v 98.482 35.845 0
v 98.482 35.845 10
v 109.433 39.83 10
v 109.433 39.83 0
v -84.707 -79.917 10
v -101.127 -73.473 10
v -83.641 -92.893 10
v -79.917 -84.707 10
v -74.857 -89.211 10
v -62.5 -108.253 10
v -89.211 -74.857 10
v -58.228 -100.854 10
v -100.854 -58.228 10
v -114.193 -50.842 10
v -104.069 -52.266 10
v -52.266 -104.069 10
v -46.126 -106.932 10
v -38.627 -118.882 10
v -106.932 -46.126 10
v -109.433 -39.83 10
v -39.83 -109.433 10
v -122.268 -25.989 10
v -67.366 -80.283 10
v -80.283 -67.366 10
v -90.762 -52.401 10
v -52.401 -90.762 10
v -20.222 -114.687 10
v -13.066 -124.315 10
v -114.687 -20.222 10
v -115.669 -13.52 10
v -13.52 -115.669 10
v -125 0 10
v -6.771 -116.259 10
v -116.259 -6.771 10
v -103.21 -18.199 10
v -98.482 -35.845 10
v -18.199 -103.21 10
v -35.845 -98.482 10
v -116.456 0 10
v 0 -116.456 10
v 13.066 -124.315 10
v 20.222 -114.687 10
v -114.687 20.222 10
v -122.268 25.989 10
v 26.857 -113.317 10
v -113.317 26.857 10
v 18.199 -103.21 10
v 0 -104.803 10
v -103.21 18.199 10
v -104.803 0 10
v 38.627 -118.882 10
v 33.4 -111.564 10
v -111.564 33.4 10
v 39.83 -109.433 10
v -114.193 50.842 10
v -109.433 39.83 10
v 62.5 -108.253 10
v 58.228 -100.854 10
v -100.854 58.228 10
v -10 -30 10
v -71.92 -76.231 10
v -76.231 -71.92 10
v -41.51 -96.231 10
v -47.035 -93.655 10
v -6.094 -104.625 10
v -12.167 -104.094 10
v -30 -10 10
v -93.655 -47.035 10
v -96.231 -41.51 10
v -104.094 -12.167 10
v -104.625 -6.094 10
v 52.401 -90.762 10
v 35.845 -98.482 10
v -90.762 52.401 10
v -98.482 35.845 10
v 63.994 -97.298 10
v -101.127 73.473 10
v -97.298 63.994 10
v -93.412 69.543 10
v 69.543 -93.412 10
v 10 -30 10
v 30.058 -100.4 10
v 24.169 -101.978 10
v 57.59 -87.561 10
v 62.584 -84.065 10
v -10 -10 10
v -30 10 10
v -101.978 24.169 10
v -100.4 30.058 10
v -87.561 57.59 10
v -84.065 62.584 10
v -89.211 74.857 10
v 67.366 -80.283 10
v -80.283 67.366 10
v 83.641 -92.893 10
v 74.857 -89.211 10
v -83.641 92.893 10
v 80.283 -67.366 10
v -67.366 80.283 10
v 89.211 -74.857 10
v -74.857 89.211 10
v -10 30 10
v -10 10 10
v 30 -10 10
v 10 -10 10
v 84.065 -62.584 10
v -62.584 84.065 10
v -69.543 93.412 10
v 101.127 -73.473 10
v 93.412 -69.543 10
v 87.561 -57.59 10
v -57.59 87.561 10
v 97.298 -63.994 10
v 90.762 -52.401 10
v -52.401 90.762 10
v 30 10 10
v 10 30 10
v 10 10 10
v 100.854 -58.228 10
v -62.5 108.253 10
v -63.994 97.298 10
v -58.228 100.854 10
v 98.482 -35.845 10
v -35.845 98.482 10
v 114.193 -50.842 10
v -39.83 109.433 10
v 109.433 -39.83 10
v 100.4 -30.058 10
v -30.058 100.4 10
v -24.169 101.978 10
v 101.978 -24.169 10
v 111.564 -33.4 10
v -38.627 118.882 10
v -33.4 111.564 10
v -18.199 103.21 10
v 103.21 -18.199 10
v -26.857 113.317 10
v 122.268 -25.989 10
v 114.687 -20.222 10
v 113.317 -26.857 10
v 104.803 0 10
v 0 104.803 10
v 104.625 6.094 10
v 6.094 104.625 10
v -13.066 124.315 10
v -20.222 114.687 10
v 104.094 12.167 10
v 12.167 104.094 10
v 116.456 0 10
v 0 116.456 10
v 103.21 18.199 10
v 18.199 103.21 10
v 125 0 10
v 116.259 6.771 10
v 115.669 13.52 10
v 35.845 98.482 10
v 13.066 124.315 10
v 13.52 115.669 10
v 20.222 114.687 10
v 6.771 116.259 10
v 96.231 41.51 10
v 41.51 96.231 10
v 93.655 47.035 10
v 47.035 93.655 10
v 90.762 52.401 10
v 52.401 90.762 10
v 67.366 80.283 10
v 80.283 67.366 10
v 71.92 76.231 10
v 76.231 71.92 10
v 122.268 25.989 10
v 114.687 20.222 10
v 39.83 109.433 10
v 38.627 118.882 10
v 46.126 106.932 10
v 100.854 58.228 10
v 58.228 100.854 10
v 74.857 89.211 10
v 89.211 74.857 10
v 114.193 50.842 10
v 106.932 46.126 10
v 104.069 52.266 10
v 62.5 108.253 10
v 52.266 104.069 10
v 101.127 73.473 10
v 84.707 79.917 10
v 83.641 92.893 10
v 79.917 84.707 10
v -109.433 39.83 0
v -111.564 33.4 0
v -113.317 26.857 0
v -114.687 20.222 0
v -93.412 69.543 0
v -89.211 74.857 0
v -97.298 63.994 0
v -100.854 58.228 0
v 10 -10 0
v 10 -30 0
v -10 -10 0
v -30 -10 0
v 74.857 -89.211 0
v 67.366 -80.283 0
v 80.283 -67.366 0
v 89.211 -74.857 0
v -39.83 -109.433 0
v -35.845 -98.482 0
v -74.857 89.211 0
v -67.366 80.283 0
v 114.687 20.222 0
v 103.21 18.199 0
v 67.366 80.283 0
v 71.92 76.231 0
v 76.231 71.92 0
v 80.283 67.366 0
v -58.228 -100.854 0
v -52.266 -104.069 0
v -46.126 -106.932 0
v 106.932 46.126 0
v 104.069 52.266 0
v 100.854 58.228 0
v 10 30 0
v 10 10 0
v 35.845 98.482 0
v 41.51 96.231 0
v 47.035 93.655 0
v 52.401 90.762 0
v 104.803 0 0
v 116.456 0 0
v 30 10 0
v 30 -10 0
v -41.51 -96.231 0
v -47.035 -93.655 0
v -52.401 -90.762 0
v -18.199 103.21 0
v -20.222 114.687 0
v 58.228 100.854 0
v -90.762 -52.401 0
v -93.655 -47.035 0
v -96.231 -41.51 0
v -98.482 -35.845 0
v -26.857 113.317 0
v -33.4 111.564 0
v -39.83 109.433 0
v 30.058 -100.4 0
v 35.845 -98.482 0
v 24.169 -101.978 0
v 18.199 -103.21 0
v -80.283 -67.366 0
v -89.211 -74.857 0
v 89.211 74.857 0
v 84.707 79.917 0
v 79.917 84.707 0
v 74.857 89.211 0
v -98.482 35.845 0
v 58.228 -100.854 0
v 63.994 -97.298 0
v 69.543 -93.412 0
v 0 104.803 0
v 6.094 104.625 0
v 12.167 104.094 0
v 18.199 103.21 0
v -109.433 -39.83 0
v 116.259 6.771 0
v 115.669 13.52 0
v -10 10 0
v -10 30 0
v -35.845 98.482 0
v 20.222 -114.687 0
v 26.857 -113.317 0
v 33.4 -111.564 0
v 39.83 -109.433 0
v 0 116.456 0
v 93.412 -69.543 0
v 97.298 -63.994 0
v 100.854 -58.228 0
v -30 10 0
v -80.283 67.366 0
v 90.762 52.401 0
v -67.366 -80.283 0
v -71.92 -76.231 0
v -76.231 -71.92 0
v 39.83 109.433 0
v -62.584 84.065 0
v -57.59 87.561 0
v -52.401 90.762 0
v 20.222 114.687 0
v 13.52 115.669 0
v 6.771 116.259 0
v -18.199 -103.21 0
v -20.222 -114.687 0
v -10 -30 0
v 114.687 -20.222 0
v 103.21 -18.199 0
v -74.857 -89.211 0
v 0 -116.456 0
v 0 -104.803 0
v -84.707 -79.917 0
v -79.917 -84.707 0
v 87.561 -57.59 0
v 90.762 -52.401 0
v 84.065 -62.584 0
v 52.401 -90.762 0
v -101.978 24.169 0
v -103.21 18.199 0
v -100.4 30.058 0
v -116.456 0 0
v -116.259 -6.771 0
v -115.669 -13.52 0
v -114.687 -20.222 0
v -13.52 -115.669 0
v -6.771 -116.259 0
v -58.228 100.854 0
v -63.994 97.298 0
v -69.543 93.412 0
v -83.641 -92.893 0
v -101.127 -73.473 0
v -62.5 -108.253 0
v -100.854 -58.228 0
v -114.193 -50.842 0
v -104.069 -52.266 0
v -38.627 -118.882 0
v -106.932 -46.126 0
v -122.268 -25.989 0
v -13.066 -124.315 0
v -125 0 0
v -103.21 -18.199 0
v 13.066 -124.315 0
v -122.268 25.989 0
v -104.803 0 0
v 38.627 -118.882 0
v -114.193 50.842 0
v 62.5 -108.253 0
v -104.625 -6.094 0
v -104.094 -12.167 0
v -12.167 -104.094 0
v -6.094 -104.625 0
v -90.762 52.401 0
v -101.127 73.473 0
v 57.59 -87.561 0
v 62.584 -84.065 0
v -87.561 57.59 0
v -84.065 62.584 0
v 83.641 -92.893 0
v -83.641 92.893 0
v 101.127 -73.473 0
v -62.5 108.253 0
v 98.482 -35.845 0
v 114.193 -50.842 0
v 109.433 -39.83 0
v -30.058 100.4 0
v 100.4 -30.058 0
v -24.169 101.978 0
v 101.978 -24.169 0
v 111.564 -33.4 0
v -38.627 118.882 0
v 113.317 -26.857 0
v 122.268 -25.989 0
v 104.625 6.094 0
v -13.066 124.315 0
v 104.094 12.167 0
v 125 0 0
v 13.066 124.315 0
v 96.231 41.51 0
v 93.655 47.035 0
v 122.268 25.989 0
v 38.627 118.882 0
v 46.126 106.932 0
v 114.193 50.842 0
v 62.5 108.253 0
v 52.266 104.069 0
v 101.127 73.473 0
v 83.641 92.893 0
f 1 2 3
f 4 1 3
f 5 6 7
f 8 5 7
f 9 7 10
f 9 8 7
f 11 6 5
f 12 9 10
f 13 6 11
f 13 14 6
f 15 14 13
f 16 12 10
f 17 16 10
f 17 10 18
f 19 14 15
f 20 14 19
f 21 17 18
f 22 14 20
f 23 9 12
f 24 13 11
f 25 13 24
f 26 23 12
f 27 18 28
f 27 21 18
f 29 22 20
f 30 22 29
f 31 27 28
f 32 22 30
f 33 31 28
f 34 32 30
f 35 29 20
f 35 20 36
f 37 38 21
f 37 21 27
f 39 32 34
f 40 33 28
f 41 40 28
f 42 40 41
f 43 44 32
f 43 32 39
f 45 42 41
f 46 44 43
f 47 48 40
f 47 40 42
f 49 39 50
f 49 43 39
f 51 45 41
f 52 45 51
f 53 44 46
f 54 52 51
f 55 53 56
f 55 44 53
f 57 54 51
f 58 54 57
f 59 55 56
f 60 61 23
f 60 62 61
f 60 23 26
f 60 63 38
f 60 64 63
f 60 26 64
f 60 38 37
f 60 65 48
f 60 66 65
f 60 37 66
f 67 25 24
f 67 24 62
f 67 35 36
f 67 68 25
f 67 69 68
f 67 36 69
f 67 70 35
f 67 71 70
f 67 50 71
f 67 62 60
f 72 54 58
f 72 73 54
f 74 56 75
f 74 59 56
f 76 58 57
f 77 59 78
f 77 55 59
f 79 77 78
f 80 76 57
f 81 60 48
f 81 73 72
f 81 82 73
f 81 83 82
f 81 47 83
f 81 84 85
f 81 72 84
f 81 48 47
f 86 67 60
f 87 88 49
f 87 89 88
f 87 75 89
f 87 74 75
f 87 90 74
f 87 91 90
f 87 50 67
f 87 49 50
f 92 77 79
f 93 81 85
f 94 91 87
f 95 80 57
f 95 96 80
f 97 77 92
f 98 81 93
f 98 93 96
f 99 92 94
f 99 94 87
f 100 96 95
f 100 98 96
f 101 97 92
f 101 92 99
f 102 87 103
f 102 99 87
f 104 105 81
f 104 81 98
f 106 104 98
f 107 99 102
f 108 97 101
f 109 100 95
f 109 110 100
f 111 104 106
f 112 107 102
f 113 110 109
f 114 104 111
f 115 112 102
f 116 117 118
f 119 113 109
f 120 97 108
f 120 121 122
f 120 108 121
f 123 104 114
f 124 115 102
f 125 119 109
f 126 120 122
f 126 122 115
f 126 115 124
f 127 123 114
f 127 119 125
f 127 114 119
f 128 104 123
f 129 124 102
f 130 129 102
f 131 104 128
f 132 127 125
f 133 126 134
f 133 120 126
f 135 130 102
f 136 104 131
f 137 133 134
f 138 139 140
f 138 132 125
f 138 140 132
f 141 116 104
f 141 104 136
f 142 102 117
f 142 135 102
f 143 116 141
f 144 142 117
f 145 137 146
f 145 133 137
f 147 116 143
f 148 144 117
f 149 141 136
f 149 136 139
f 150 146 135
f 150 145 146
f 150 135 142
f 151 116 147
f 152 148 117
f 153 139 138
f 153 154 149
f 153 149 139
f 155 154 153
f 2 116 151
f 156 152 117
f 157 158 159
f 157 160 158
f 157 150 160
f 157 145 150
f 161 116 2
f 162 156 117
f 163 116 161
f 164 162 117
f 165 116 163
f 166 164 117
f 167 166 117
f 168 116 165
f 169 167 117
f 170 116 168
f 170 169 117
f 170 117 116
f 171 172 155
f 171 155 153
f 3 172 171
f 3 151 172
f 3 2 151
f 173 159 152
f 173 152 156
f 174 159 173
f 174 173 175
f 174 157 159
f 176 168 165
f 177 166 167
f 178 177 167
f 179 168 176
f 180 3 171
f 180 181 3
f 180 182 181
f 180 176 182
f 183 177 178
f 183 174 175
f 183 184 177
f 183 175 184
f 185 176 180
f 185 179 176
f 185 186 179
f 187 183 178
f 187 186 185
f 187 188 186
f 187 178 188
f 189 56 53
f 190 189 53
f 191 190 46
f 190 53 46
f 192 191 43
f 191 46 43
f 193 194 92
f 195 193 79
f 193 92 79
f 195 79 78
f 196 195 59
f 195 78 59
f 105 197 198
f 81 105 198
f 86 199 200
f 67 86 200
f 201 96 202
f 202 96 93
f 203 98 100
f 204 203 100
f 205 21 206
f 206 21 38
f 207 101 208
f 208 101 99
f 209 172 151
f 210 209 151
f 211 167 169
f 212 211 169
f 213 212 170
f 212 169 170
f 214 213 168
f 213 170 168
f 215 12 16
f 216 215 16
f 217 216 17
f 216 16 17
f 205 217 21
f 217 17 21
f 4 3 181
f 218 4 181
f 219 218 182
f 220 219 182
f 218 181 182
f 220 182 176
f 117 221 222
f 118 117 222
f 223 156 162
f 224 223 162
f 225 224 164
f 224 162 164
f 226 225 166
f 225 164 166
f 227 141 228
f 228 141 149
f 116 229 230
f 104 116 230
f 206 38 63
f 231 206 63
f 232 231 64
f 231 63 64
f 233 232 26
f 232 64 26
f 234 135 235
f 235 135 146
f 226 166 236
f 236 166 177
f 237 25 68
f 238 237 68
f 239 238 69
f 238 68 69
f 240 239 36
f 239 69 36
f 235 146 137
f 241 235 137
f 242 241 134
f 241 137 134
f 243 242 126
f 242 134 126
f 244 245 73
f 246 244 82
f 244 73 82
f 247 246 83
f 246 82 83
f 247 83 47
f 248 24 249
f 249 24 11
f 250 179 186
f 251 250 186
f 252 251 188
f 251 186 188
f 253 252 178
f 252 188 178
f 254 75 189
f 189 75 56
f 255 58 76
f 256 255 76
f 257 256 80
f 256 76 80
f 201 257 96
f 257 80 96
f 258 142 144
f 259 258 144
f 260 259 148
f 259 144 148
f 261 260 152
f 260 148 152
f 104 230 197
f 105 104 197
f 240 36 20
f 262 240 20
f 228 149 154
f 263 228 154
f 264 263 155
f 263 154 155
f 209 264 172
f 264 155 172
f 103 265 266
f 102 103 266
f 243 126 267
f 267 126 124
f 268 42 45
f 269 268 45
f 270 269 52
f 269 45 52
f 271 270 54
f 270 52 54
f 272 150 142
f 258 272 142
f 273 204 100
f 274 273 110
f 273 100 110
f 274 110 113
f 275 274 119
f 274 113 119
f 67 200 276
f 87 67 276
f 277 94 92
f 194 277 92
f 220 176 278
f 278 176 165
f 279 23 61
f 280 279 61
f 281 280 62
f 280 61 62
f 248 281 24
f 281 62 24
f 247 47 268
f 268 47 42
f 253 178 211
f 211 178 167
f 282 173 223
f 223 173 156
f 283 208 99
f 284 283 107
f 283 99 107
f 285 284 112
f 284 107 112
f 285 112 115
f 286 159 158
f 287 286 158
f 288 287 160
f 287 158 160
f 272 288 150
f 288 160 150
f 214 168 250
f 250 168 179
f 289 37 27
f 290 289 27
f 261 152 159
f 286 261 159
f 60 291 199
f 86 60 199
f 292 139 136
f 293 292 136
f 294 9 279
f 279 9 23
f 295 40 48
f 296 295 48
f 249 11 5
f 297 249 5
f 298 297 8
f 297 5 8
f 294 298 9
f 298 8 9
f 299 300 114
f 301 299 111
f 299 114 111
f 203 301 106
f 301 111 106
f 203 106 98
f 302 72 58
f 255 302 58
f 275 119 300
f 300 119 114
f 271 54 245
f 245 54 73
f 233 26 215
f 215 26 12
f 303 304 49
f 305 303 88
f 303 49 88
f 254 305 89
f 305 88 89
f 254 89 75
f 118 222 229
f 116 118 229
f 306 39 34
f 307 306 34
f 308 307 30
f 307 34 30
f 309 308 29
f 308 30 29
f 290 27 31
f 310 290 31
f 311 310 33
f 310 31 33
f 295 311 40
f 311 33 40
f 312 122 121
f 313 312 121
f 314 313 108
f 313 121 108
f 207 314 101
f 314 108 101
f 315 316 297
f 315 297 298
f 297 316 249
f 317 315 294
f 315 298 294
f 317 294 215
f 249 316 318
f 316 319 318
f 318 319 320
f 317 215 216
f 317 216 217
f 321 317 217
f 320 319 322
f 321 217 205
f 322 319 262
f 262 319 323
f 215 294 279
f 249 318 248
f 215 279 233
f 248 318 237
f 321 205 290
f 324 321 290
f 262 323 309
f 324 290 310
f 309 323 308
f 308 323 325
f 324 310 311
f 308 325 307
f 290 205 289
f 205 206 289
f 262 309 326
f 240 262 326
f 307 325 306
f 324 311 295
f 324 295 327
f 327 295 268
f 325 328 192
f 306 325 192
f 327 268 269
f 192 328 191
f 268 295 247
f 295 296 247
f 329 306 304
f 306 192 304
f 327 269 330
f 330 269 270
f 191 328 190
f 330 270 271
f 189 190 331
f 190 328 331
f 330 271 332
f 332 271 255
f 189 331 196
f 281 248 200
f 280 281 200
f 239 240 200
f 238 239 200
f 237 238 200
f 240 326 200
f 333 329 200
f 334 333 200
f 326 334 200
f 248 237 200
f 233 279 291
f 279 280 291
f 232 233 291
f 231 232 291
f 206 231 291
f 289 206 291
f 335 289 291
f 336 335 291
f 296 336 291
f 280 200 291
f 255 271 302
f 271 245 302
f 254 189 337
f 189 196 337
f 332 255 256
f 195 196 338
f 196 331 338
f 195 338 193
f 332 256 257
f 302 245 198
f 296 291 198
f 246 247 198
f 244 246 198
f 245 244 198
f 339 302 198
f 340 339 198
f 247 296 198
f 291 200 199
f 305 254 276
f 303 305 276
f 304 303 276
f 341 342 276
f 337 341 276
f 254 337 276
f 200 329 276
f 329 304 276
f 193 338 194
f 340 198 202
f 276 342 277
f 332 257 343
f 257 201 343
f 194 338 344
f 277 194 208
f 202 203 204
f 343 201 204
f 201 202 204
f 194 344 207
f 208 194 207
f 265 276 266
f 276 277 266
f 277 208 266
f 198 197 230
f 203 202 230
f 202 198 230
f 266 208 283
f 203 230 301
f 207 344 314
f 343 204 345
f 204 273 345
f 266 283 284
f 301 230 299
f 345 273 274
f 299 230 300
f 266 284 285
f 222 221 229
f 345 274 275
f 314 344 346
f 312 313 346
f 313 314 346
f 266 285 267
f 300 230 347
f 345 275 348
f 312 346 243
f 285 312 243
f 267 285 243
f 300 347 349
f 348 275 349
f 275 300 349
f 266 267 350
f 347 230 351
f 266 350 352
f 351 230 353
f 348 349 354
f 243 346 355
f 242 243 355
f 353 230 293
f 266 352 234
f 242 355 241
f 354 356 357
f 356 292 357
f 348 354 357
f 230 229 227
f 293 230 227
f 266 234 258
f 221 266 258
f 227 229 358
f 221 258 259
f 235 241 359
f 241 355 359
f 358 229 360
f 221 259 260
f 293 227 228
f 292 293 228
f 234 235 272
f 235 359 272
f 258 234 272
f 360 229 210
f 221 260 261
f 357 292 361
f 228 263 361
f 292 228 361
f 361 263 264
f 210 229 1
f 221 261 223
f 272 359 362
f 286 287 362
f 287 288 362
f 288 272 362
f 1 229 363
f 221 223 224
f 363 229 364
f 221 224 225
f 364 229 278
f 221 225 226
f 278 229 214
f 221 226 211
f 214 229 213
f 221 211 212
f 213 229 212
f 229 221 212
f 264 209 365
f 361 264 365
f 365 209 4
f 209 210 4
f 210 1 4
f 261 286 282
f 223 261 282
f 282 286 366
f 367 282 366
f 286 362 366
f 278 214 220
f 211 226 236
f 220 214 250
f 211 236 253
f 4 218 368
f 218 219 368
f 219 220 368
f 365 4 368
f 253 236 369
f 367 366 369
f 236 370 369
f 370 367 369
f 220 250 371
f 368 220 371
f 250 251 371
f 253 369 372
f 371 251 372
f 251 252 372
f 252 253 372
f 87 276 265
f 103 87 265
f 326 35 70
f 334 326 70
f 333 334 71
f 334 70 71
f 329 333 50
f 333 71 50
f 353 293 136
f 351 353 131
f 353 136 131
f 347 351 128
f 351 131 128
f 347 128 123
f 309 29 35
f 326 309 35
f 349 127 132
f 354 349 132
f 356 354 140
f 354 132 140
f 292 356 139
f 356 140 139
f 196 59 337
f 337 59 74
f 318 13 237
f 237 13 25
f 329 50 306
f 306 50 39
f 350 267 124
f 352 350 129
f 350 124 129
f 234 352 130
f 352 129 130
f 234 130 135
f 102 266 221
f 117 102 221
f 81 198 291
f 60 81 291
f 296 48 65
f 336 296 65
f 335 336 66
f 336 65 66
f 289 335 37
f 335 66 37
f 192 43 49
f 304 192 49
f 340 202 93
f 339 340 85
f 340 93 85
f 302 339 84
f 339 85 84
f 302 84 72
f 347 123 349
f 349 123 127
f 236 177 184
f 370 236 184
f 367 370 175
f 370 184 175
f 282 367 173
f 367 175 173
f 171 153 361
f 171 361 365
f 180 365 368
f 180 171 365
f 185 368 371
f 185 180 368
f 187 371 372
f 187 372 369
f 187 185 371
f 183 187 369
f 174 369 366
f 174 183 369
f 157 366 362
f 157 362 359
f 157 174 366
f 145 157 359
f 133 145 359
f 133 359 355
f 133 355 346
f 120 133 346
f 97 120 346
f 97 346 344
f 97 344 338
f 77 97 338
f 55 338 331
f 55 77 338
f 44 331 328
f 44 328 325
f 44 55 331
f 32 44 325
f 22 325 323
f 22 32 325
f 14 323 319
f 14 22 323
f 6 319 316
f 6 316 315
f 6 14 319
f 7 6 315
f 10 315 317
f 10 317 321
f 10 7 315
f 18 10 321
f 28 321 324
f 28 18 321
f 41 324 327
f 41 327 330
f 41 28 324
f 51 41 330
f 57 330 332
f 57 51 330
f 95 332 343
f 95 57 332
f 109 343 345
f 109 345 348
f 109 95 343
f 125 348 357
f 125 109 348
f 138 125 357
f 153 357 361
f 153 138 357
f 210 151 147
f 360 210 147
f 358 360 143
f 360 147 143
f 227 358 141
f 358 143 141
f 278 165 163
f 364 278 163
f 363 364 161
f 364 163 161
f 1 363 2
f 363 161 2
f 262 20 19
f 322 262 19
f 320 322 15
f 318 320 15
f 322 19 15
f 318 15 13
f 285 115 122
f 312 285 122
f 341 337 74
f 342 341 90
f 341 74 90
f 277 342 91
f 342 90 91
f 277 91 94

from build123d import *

# Parameters (mm, degrees)
F0_R     = 50
F1_DEPTH = 10
F2_R     = 125
F2_R_2   = 40.44952
F3_DEPTH = 10
F5_DEPTH = 25


with BuildPart() as f1:
    # F0 (on Top) → F1 (new body)
    with BuildSketch(Plane.XY):
        Circle(F0_R)
        Polygon((-10, 30), (0, 30), (10, 30), (10, 10), (30, 10), (30, 0), (30, -10), (10, -10), (10, -30), (0, -30), (-10, -30), (-10, -10), (-30, -10), (-30, 0), (-30, 10), (-10, 10), align=None, mode=Mode.SUBTRACT)
    extrude(amount=F1_DEPTH)

    # F2 (on face) → F3 (join)
    with BuildSketch(Plane.XY.offset(10)):
        Circle(F2_R)
        Circle(F2_R_2, mode=Mode.SUBTRACT)
    extrude(amount=-F3_DEPTH)

    # F4 (on face) → F5 (cut)
    with BuildSketch(Plane.XY.offset(10)):
        with BuildLine():
            Line((0, 116.456337), (0, 104.802647))
            ThreePointArc((0, 104.802647), (9.134153, 104.403842), (18.198789, 103.21046))
            Line((18.198789, 103.21046), (20.222431, 114.687104))
            ThreePointArc((20.222431, 114.687104), (10.149839, 116.013186), (0, 116.456337))
        make_face()
        with BuildLine():
            ThreePointArc((-35.844616, 98.482274), (-27.124921, 101.231584), (-18.198789, 103.21046))
            Line((-18.198789, 103.21046), (-20.222431, 114.687104))
            ThreePointArc((-20.222431, 114.687104), (-30.141118, 112.488184), (-39.830413, 109.433161))
            Line((-39.830413, 109.433161), (-35.844616, 98.482274))
        make_face()
        with BuildLine():
            ThreePointArc((-67.365843, 80.283486), (-60.112329, 85.849303), (-52.401324, 90.761755))
            Line((-52.401324, 90.761755), (-58.228169, 100.854147))
            ThreePointArc((-58.228169, 100.854147), (-66.796611, 95.395447), (-74.856691, 89.21073))
            Line((-74.856691, 89.21073), (-67.365843, 80.283486))
        make_face()
        with BuildLine():
            ThreePointArc((-90.761755, 52.401324), (-85.849303, 60.112329), (-80.283486, 67.365843))
            Line((-80.283486, 67.365843), (-89.21073, 74.856691))
            ThreePointArc((-89.21073, 74.856691), (-95.395447, 66.796611), (-100.854147, 58.228169))
            Line((-100.854147, 58.228169), (-90.761755, 52.401324))
        make_face()
        with BuildLine():
            ThreePointArc((-103.21046, 18.198789), (-101.231584, 27.124921), (-98.482274, 35.844616))
            Line((-98.482274, 35.844616), (-109.433161, 39.830413))
            ThreePointArc((-109.433161, 39.830413), (-112.488184, 30.141118), (-114.687104, 20.222431))
            Line((-114.687104, 20.222431), (-103.21046, 18.198789))
        make_face()
        with BuildLine():
            ThreePointArc((-103.21046, -18.198789), (-104.403842, -9.134153), (-104.802647, 0))
            Line((-104.802647, 0), (-116.456337, 0))
            ThreePointArc((-116.456337, 0), (-116.013186, -10.149839), (-114.687104, -20.222431))
            Line((-114.687104, -20.222431), (-103.21046, -18.198789))
        make_face()
        with BuildLine():
            ThreePointArc((-90.761755, -52.401324), (-94.983455, -44.291513), (-98.482274, -35.844616))
            Line((-98.482274, -35.844616), (-109.433161, -39.830413))
            ThreePointArc((-109.433161, -39.830413), (-105.545285, -49.216575), (-100.854147, -58.228169))
            Line((-100.854147, -58.228169), (-90.761755, -52.401324))
        make_face()
        with BuildLine():
            ThreePointArc((-67.365843, -80.283486), (-74.106663, -74.106663), (-80.283486, -67.365843))
            Line((-80.283486, -67.365843), (-89.21073, -74.856691))
            ThreePointArc((-89.21073, -74.856691), (-82.347066, -82.347066), (-74.856691, -89.21073))
            Line((-74.856691, -89.21073), (-67.365843, -80.283486))
        make_face()
        with BuildLine():
            ThreePointArc((-35.844616, -98.482274), (-44.291513, -94.983455), (-52.401324, -90.761755))
            Line((-52.401324, -90.761755), (-58.228169, -100.854147))
            ThreePointArc((-58.228169, -100.854147), (-49.216575, -105.545285), (-39.830413, -109.433161))
            Line((-39.830413, -109.433161), (-35.844616, -98.482274))
        make_face()
        with BuildLine():
            ThreePointArc((0, -104.802647), (-9.134153, -104.403842), (-18.198789, -103.21046))
            Line((-18.198789, -103.21046), (-20.222431, -114.687104))
            ThreePointArc((-20.222431, -114.687104), (-10.149839, -116.013186), (0, -116.456337))
            Line((0, -116.456337), (0, -104.802647))
        make_face()
        with BuildLine():
            ThreePointArc((35.844616, -98.482274), (27.124921, -101.231584), (18.198789, -103.21046))
            Line((18.198789, -103.21046), (20.222431, -114.687104))
            ThreePointArc((20.222431, -114.687104), (30.141118, -112.488184), (39.830413, -109.433161))
            Line((39.830413, -109.433161), (35.844616, -98.482274))
        make_face()
        with BuildLine():
            ThreePointArc((67.365843, -80.283486), (60.112329, -85.849303), (52.401324, -90.761755))
            Line((52.401324, -90.761755), (58.228169, -100.854147))
            ThreePointArc((58.228169, -100.854147), (66.796611, -95.395447), (74.856691, -89.21073))
            Line((74.856691, -89.21073), (67.365843, -80.283486))
        make_face()
        with BuildLine():
            ThreePointArc((90.761755, -52.401324), (85.849303, -60.112329), (80.283486, -67.365843))
            Line((80.283486, -67.365843), (89.21073, -74.856691))
            ThreePointArc((89.21073, -74.856691), (95.395447, -66.796611), (100.854147, -58.228169))
            Line((100.854147, -58.228169), (90.761755, -52.401324))
        make_face()
        with BuildLine():
            ThreePointArc((103.21046, -18.198789), (101.231584, -27.124921), (98.482274, -35.844616))
            Line((98.482274, -35.844616), (109.433161, -39.830413))
            ThreePointArc((109.433161, -39.830413), (112.488184, -30.141118), (114.687104, -20.222431))
            Line((114.687104, -20.222431), (103.21046, -18.198789))
        make_face()
        with BuildLine():
            ThreePointArc((103.21046, 18.198789), (104.403842, 9.134153), (104.802647, 0))
            Line((104.802647, 0), (116.456337, 0))
            ThreePointArc((116.456337, 0), (116.013186, 10.149839), (114.687104, 20.222431))
            Line((114.687104, 20.222431), (103.21046, 18.198789))
        make_face()
        with BuildLine():
            ThreePointArc((90.761755, 52.401324), (94.983455, 44.291513), (98.482274, 35.844616))
            Line((98.482274, 35.844616), (109.433161, 39.830413))
            ThreePointArc((109.433161, 39.830413), (105.545285, 49.216575), (100.854147, 58.228169))
            Line((100.854147, 58.228169), (90.761755, 52.401324))
        make_face()
        with BuildLine():
            ThreePointArc((67.365843, 80.283486), (74.106663, 74.106663), (80.283486, 67.365843))
            Line((80.283486, 67.365843), (89.21073, 74.856691))
            ThreePointArc((89.21073, 74.856691), (82.347066, 82.347066), (74.856691, 89.21073))
            Line((74.856691, 89.21073), (67.365843, 80.283486))
        make_face()
        with BuildLine():
            ThreePointArc((35.844616, 98.482274), (44.291513, 94.983455), (52.401324, 90.761755))
            Line((52.401324, 90.761755), (58.228169, 100.854147))
            ThreePointArc((58.228169, 100.854147), (49.216575, 105.545285), (39.830413, 109.433161))
            Line((39.830413, 109.433161), (35.844616, 98.482274))
        make_face()
    extrude(amount=-F5_DEPTH, mode=Mode.SUBTRACT)


solid = f1.part
